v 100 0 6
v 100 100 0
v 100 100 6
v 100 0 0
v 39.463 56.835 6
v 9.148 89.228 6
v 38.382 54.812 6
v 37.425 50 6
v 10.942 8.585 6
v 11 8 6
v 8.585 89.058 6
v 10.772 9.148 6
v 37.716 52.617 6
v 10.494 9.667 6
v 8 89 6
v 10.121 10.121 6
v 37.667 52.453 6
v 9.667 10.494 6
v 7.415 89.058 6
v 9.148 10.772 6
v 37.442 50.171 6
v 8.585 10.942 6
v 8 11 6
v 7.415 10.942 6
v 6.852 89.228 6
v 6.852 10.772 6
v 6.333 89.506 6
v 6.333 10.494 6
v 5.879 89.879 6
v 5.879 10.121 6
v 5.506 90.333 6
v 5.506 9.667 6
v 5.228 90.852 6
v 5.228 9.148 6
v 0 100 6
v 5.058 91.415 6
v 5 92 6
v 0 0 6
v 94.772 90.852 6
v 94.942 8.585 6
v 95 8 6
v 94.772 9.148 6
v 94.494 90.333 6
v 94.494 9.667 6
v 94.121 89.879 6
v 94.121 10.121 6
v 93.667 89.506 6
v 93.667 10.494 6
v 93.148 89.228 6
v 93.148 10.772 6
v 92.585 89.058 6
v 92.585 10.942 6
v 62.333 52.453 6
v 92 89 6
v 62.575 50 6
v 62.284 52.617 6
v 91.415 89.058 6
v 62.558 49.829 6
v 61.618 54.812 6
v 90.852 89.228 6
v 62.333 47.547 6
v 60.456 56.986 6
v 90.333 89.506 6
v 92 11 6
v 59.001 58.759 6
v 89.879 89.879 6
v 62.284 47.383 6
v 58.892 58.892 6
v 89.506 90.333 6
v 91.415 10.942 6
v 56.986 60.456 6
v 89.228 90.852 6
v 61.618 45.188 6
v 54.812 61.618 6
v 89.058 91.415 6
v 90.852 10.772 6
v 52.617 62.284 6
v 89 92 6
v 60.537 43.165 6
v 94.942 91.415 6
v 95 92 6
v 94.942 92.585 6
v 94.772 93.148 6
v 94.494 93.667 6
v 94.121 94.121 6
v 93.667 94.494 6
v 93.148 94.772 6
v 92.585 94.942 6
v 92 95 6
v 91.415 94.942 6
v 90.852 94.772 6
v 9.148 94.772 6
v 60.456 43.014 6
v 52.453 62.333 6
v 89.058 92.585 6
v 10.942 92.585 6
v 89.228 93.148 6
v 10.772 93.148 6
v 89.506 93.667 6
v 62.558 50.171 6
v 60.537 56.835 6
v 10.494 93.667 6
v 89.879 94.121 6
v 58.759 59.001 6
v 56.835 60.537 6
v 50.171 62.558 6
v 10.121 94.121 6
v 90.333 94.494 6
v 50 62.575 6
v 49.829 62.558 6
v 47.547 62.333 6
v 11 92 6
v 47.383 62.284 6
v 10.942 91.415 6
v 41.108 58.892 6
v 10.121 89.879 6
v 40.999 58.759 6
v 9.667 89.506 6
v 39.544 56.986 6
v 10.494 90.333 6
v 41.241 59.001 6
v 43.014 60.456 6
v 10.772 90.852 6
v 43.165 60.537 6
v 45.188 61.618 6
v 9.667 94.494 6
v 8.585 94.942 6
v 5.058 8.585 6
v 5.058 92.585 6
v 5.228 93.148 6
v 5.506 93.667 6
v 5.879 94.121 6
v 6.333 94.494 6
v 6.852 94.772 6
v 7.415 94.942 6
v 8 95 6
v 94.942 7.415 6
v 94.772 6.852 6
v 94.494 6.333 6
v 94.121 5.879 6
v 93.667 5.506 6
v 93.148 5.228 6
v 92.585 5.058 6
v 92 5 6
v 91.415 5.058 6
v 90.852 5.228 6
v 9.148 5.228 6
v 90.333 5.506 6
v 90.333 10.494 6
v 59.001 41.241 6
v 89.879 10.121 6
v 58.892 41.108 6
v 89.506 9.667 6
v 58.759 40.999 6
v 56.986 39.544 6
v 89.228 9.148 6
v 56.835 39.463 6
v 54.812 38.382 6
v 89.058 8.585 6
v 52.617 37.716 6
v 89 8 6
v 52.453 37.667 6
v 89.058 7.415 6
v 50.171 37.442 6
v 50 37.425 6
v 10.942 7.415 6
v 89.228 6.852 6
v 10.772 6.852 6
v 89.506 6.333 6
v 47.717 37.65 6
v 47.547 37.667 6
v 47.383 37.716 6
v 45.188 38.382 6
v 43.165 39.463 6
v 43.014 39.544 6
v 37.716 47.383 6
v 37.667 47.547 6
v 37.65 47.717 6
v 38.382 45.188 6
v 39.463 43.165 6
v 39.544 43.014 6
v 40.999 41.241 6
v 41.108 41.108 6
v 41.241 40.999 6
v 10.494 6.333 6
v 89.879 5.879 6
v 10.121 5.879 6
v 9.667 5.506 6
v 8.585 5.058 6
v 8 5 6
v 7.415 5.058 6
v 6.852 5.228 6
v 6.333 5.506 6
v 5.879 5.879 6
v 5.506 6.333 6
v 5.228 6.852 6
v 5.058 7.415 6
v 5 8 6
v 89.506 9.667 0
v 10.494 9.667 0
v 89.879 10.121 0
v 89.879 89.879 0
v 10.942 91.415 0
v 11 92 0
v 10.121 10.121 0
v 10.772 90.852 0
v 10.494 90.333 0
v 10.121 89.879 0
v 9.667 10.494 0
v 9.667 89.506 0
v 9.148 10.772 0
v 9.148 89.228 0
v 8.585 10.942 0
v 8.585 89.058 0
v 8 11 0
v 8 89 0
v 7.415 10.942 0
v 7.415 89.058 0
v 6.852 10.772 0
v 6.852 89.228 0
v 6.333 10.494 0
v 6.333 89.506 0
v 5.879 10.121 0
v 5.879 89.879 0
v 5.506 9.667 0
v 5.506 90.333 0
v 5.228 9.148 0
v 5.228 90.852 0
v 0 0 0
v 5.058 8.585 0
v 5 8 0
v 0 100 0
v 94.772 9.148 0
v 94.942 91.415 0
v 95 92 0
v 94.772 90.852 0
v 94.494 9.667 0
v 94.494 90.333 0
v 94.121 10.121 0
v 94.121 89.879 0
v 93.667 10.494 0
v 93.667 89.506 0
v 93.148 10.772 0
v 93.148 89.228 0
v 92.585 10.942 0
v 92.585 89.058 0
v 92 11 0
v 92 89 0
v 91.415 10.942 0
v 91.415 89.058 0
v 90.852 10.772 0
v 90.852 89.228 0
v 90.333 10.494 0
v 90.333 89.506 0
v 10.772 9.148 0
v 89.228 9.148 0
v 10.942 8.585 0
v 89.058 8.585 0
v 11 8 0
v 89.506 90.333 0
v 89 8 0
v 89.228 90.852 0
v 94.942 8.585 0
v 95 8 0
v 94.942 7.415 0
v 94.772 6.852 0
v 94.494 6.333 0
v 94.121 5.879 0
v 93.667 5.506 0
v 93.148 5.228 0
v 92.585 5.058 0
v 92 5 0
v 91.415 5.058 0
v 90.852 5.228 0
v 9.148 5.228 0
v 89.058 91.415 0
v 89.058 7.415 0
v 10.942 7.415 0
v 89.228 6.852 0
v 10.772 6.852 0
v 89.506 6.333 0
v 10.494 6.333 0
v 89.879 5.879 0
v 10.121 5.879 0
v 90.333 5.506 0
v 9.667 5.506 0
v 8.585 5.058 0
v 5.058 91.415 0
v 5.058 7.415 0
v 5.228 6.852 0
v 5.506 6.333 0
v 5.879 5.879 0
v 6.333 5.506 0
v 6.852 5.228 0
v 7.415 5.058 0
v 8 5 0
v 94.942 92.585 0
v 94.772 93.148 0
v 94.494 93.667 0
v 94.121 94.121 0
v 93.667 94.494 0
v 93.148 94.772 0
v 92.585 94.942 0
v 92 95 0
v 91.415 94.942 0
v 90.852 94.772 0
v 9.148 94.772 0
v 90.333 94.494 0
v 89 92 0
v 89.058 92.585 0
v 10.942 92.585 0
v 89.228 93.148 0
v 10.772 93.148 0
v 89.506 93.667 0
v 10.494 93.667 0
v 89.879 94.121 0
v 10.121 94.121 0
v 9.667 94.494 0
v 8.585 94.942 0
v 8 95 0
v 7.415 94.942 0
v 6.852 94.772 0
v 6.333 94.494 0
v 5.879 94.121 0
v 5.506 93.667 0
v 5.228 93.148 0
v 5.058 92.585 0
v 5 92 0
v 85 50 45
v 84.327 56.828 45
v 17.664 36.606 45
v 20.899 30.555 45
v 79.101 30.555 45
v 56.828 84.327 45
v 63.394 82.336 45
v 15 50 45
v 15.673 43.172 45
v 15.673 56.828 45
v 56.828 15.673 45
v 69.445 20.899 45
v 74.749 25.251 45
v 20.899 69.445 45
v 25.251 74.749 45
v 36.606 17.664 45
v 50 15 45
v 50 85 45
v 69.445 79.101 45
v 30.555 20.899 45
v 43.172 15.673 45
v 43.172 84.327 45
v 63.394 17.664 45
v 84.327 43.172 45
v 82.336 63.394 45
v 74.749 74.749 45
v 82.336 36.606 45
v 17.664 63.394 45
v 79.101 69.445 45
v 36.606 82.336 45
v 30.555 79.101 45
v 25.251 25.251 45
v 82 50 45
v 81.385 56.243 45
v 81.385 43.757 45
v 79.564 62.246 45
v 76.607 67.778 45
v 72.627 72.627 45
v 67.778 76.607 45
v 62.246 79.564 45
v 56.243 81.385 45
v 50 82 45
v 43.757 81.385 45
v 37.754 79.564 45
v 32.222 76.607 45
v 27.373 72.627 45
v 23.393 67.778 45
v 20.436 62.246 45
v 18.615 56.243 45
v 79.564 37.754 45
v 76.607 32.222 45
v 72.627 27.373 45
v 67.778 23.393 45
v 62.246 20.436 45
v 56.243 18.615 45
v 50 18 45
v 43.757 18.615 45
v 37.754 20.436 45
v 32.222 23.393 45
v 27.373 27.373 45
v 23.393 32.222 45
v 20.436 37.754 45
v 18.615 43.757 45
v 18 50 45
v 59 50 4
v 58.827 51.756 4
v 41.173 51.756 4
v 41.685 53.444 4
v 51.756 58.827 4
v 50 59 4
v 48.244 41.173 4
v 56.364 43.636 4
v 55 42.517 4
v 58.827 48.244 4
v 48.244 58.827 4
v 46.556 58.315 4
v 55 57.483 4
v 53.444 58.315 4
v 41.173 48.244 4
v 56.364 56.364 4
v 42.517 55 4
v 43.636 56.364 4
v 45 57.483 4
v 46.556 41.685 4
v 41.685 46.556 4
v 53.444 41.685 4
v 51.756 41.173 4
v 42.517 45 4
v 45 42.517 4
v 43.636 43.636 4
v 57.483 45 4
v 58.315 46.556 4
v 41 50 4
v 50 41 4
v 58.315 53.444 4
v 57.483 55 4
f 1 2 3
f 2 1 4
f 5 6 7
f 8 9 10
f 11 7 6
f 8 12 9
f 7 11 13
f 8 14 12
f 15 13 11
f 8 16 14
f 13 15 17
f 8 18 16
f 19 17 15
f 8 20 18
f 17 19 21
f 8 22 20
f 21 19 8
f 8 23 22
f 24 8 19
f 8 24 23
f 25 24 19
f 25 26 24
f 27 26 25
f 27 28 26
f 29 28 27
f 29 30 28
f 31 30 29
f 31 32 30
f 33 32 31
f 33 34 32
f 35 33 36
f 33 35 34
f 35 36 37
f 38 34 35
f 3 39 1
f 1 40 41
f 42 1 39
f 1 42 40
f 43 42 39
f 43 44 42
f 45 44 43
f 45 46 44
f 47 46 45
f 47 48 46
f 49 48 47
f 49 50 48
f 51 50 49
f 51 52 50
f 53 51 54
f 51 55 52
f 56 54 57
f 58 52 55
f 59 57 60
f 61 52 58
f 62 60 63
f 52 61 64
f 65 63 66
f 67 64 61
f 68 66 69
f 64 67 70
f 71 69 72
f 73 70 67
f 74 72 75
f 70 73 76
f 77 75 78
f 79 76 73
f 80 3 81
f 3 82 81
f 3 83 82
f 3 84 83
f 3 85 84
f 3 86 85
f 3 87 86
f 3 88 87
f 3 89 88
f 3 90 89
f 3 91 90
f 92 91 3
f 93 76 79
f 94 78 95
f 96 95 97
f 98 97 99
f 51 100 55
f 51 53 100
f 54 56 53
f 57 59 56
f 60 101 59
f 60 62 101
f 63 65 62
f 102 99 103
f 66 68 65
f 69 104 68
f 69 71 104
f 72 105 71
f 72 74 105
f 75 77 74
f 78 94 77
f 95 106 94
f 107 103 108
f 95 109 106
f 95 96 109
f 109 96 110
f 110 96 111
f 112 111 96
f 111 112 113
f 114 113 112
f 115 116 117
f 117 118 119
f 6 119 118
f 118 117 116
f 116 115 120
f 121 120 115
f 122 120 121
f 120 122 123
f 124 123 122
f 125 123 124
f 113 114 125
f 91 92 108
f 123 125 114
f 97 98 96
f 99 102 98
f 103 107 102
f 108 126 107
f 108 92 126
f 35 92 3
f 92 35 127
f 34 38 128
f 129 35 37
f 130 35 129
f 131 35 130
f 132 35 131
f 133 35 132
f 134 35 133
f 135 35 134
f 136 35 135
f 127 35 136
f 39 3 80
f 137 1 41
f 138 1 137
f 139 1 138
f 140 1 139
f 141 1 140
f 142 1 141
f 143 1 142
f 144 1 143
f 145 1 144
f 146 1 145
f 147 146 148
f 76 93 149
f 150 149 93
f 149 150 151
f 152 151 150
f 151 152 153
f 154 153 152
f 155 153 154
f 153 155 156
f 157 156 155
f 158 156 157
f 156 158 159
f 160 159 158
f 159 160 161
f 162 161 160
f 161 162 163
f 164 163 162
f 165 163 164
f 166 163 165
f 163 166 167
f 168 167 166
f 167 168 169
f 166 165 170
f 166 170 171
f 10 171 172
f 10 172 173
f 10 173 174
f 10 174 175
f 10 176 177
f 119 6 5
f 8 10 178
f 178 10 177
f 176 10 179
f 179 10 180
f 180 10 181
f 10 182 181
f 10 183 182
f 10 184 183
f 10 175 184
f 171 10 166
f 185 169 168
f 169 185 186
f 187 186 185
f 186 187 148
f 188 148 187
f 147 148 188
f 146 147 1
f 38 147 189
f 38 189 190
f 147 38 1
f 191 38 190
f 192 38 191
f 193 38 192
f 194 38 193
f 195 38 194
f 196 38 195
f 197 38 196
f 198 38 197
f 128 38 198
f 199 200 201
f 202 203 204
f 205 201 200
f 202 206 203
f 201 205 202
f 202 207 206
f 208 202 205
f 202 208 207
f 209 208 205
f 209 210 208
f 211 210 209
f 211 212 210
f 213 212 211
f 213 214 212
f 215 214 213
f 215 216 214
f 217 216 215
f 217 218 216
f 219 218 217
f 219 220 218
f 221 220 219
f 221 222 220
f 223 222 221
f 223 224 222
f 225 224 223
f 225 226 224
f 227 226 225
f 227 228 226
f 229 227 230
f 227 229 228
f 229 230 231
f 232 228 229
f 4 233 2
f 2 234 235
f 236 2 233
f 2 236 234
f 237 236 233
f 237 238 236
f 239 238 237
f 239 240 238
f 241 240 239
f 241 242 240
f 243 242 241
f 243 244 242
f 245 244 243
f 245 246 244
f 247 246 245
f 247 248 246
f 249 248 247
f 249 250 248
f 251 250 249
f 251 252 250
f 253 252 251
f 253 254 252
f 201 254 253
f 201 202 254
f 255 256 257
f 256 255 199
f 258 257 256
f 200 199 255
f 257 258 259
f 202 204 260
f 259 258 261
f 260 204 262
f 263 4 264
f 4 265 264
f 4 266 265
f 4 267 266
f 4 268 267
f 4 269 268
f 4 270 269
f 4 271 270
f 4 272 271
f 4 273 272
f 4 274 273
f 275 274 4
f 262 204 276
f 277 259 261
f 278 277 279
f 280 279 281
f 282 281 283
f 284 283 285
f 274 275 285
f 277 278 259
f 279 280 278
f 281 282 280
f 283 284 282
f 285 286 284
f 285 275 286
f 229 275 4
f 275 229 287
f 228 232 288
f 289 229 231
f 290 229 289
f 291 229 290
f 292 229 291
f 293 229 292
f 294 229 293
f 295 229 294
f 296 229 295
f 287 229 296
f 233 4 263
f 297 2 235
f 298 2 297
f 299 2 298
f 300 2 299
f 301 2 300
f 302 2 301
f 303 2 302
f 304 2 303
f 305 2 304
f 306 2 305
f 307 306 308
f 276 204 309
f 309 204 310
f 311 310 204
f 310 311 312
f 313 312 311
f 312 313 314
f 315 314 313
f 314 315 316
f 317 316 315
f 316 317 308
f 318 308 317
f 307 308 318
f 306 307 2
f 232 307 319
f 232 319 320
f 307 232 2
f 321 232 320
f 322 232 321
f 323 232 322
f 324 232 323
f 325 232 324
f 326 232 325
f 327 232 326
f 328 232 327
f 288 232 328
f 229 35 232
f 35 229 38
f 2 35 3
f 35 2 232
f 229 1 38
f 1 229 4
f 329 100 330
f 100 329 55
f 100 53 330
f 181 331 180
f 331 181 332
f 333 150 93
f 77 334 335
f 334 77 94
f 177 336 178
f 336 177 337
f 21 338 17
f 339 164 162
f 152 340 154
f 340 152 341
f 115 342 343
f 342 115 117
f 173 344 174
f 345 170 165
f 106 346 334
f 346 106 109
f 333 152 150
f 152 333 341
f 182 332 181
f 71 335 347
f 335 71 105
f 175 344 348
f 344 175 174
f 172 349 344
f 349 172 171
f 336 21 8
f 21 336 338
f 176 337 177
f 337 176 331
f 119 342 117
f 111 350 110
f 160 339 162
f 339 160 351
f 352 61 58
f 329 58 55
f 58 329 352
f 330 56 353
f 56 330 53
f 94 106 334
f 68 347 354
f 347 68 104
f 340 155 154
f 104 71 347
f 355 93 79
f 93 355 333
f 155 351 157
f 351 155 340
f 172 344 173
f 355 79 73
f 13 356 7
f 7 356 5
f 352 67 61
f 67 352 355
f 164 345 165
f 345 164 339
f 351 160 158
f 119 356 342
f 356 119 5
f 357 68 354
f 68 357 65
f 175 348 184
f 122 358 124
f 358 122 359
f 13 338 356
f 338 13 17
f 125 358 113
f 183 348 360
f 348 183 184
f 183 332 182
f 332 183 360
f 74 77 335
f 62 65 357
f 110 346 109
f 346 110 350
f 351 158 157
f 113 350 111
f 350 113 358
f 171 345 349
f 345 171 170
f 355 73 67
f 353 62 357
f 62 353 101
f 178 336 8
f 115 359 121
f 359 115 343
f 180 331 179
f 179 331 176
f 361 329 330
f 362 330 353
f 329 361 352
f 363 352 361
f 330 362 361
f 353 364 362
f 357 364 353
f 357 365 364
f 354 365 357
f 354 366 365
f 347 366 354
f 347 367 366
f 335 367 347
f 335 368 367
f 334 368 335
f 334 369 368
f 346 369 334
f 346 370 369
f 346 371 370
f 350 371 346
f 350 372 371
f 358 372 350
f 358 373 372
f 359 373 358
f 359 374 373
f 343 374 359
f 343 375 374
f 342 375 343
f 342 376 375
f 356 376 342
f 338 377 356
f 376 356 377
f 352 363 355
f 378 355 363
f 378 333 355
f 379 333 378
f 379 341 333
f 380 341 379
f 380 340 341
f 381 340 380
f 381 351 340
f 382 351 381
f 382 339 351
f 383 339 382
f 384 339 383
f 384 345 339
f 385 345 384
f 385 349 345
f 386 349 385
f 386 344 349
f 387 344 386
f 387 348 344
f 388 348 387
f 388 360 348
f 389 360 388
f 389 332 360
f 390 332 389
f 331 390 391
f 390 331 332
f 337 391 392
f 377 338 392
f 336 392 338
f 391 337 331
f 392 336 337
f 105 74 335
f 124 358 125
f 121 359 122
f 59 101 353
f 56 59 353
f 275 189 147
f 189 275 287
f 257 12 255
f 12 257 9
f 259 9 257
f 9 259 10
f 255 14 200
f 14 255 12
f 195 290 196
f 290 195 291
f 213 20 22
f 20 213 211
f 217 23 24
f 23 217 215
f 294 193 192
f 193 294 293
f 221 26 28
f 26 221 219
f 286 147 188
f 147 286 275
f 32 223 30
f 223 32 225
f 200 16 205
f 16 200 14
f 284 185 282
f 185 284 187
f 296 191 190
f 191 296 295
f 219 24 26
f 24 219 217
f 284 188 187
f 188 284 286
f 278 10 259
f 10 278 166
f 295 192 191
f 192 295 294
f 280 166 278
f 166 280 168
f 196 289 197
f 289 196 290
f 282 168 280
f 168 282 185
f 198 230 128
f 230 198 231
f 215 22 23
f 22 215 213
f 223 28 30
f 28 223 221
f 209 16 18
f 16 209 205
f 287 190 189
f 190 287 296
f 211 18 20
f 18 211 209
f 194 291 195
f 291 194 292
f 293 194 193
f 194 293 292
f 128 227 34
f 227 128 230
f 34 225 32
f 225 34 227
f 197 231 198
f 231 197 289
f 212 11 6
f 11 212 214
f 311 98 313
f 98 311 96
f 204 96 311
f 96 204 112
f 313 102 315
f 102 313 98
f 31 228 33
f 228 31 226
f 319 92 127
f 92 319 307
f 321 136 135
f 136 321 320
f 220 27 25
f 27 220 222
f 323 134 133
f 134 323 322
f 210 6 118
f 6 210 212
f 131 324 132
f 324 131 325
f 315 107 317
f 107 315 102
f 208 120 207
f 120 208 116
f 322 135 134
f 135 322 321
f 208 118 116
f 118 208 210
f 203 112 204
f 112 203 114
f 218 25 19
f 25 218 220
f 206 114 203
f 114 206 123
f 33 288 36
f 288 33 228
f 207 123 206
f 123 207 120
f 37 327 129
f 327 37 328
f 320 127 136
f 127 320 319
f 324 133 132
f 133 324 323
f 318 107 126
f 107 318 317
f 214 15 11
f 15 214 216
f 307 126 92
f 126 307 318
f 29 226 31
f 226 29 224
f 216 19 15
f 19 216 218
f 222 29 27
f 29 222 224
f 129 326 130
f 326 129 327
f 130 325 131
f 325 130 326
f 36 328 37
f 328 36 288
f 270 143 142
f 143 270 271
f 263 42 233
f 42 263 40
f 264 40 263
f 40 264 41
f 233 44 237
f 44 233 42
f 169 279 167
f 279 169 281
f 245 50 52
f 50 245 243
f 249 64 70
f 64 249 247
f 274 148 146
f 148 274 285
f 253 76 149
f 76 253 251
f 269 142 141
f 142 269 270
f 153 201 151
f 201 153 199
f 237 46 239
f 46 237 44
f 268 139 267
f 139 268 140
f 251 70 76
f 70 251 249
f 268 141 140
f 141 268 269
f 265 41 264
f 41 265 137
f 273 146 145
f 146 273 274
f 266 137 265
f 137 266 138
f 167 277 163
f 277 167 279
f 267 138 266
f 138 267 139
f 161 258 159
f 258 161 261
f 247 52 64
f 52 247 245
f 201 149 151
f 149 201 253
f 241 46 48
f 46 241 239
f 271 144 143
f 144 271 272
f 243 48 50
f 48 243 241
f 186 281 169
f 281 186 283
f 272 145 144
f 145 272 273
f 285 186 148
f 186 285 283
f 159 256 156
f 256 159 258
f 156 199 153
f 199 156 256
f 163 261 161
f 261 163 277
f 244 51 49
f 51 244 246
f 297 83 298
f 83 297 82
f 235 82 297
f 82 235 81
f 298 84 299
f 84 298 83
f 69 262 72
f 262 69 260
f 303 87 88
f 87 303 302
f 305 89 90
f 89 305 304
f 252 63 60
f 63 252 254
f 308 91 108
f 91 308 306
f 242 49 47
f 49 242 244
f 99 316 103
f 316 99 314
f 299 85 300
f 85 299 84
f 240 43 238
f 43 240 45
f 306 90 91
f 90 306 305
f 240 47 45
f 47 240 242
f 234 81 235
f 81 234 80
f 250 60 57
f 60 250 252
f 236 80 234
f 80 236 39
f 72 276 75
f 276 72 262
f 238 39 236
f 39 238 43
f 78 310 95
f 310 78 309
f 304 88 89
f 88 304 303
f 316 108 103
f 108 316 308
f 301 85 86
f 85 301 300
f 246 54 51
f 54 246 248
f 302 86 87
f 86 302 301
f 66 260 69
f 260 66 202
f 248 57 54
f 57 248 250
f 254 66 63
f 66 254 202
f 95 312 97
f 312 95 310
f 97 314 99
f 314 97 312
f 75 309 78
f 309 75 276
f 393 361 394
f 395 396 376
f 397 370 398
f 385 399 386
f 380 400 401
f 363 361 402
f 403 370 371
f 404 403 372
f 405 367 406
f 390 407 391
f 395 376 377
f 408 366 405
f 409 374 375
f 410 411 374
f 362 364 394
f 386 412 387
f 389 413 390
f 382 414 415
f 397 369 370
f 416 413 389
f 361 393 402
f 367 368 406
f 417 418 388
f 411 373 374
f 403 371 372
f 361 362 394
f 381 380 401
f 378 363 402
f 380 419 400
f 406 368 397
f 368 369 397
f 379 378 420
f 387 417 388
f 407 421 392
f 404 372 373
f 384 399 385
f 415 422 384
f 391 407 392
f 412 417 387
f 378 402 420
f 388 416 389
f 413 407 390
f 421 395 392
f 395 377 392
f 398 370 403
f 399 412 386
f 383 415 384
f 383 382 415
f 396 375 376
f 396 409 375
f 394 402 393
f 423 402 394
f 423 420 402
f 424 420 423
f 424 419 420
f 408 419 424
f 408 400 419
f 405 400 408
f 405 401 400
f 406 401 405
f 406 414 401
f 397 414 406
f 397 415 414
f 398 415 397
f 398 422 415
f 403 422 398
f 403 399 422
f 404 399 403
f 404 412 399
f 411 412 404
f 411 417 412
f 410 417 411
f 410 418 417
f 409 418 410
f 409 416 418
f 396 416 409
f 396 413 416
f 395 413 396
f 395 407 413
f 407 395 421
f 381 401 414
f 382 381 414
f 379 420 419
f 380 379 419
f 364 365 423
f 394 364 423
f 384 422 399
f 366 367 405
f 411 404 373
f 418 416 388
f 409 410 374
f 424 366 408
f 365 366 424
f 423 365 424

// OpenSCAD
$fn = 32;

// ----------------------------------------------------------------------
// Hopper: flanged with square flange
// ----------------------------------------------------------------------

// --- parameters (mm) ---
fl = 100;                 // flange side, X and Y
fl_t = 6;                 // flange thickness
cone_h = 40;              // cone height above the flange
top_d = 70;               // cone mouth diameter
bot_d = 24;               // cone spout diameter
wall = 3;                 // cone wall thickness
hole_r = 3;               // flange hole radius
hole_in = 8;              // hole inset from the corners

bore_d = bot_d - 2 * wall;  // spout bore diameter
total_h = fl_t + cone_h - 1;  // overall height

difference() {
  union() {
    cube([fl, fl, fl_t]);
    translate([fl / 2, fl / 2, fl_t - 1])
      cylinder(h = cone_h, d1 = bot_d, d2 = top_d);
  }
  translate([fl / 2, fl / 2, fl_t - 2])
    cylinder(h = cone_h + 1, d1 = bore_d, d2 = top_d - 2 * wall);
  for (sx = [0, 1], sy = [0, 1])
    translate([sx ? fl - hole_in : hole_in,
               sy ? fl - hole_in : hole_in, -1])
      cylinder(r = hole_r, h = fl_t + 2);
}
